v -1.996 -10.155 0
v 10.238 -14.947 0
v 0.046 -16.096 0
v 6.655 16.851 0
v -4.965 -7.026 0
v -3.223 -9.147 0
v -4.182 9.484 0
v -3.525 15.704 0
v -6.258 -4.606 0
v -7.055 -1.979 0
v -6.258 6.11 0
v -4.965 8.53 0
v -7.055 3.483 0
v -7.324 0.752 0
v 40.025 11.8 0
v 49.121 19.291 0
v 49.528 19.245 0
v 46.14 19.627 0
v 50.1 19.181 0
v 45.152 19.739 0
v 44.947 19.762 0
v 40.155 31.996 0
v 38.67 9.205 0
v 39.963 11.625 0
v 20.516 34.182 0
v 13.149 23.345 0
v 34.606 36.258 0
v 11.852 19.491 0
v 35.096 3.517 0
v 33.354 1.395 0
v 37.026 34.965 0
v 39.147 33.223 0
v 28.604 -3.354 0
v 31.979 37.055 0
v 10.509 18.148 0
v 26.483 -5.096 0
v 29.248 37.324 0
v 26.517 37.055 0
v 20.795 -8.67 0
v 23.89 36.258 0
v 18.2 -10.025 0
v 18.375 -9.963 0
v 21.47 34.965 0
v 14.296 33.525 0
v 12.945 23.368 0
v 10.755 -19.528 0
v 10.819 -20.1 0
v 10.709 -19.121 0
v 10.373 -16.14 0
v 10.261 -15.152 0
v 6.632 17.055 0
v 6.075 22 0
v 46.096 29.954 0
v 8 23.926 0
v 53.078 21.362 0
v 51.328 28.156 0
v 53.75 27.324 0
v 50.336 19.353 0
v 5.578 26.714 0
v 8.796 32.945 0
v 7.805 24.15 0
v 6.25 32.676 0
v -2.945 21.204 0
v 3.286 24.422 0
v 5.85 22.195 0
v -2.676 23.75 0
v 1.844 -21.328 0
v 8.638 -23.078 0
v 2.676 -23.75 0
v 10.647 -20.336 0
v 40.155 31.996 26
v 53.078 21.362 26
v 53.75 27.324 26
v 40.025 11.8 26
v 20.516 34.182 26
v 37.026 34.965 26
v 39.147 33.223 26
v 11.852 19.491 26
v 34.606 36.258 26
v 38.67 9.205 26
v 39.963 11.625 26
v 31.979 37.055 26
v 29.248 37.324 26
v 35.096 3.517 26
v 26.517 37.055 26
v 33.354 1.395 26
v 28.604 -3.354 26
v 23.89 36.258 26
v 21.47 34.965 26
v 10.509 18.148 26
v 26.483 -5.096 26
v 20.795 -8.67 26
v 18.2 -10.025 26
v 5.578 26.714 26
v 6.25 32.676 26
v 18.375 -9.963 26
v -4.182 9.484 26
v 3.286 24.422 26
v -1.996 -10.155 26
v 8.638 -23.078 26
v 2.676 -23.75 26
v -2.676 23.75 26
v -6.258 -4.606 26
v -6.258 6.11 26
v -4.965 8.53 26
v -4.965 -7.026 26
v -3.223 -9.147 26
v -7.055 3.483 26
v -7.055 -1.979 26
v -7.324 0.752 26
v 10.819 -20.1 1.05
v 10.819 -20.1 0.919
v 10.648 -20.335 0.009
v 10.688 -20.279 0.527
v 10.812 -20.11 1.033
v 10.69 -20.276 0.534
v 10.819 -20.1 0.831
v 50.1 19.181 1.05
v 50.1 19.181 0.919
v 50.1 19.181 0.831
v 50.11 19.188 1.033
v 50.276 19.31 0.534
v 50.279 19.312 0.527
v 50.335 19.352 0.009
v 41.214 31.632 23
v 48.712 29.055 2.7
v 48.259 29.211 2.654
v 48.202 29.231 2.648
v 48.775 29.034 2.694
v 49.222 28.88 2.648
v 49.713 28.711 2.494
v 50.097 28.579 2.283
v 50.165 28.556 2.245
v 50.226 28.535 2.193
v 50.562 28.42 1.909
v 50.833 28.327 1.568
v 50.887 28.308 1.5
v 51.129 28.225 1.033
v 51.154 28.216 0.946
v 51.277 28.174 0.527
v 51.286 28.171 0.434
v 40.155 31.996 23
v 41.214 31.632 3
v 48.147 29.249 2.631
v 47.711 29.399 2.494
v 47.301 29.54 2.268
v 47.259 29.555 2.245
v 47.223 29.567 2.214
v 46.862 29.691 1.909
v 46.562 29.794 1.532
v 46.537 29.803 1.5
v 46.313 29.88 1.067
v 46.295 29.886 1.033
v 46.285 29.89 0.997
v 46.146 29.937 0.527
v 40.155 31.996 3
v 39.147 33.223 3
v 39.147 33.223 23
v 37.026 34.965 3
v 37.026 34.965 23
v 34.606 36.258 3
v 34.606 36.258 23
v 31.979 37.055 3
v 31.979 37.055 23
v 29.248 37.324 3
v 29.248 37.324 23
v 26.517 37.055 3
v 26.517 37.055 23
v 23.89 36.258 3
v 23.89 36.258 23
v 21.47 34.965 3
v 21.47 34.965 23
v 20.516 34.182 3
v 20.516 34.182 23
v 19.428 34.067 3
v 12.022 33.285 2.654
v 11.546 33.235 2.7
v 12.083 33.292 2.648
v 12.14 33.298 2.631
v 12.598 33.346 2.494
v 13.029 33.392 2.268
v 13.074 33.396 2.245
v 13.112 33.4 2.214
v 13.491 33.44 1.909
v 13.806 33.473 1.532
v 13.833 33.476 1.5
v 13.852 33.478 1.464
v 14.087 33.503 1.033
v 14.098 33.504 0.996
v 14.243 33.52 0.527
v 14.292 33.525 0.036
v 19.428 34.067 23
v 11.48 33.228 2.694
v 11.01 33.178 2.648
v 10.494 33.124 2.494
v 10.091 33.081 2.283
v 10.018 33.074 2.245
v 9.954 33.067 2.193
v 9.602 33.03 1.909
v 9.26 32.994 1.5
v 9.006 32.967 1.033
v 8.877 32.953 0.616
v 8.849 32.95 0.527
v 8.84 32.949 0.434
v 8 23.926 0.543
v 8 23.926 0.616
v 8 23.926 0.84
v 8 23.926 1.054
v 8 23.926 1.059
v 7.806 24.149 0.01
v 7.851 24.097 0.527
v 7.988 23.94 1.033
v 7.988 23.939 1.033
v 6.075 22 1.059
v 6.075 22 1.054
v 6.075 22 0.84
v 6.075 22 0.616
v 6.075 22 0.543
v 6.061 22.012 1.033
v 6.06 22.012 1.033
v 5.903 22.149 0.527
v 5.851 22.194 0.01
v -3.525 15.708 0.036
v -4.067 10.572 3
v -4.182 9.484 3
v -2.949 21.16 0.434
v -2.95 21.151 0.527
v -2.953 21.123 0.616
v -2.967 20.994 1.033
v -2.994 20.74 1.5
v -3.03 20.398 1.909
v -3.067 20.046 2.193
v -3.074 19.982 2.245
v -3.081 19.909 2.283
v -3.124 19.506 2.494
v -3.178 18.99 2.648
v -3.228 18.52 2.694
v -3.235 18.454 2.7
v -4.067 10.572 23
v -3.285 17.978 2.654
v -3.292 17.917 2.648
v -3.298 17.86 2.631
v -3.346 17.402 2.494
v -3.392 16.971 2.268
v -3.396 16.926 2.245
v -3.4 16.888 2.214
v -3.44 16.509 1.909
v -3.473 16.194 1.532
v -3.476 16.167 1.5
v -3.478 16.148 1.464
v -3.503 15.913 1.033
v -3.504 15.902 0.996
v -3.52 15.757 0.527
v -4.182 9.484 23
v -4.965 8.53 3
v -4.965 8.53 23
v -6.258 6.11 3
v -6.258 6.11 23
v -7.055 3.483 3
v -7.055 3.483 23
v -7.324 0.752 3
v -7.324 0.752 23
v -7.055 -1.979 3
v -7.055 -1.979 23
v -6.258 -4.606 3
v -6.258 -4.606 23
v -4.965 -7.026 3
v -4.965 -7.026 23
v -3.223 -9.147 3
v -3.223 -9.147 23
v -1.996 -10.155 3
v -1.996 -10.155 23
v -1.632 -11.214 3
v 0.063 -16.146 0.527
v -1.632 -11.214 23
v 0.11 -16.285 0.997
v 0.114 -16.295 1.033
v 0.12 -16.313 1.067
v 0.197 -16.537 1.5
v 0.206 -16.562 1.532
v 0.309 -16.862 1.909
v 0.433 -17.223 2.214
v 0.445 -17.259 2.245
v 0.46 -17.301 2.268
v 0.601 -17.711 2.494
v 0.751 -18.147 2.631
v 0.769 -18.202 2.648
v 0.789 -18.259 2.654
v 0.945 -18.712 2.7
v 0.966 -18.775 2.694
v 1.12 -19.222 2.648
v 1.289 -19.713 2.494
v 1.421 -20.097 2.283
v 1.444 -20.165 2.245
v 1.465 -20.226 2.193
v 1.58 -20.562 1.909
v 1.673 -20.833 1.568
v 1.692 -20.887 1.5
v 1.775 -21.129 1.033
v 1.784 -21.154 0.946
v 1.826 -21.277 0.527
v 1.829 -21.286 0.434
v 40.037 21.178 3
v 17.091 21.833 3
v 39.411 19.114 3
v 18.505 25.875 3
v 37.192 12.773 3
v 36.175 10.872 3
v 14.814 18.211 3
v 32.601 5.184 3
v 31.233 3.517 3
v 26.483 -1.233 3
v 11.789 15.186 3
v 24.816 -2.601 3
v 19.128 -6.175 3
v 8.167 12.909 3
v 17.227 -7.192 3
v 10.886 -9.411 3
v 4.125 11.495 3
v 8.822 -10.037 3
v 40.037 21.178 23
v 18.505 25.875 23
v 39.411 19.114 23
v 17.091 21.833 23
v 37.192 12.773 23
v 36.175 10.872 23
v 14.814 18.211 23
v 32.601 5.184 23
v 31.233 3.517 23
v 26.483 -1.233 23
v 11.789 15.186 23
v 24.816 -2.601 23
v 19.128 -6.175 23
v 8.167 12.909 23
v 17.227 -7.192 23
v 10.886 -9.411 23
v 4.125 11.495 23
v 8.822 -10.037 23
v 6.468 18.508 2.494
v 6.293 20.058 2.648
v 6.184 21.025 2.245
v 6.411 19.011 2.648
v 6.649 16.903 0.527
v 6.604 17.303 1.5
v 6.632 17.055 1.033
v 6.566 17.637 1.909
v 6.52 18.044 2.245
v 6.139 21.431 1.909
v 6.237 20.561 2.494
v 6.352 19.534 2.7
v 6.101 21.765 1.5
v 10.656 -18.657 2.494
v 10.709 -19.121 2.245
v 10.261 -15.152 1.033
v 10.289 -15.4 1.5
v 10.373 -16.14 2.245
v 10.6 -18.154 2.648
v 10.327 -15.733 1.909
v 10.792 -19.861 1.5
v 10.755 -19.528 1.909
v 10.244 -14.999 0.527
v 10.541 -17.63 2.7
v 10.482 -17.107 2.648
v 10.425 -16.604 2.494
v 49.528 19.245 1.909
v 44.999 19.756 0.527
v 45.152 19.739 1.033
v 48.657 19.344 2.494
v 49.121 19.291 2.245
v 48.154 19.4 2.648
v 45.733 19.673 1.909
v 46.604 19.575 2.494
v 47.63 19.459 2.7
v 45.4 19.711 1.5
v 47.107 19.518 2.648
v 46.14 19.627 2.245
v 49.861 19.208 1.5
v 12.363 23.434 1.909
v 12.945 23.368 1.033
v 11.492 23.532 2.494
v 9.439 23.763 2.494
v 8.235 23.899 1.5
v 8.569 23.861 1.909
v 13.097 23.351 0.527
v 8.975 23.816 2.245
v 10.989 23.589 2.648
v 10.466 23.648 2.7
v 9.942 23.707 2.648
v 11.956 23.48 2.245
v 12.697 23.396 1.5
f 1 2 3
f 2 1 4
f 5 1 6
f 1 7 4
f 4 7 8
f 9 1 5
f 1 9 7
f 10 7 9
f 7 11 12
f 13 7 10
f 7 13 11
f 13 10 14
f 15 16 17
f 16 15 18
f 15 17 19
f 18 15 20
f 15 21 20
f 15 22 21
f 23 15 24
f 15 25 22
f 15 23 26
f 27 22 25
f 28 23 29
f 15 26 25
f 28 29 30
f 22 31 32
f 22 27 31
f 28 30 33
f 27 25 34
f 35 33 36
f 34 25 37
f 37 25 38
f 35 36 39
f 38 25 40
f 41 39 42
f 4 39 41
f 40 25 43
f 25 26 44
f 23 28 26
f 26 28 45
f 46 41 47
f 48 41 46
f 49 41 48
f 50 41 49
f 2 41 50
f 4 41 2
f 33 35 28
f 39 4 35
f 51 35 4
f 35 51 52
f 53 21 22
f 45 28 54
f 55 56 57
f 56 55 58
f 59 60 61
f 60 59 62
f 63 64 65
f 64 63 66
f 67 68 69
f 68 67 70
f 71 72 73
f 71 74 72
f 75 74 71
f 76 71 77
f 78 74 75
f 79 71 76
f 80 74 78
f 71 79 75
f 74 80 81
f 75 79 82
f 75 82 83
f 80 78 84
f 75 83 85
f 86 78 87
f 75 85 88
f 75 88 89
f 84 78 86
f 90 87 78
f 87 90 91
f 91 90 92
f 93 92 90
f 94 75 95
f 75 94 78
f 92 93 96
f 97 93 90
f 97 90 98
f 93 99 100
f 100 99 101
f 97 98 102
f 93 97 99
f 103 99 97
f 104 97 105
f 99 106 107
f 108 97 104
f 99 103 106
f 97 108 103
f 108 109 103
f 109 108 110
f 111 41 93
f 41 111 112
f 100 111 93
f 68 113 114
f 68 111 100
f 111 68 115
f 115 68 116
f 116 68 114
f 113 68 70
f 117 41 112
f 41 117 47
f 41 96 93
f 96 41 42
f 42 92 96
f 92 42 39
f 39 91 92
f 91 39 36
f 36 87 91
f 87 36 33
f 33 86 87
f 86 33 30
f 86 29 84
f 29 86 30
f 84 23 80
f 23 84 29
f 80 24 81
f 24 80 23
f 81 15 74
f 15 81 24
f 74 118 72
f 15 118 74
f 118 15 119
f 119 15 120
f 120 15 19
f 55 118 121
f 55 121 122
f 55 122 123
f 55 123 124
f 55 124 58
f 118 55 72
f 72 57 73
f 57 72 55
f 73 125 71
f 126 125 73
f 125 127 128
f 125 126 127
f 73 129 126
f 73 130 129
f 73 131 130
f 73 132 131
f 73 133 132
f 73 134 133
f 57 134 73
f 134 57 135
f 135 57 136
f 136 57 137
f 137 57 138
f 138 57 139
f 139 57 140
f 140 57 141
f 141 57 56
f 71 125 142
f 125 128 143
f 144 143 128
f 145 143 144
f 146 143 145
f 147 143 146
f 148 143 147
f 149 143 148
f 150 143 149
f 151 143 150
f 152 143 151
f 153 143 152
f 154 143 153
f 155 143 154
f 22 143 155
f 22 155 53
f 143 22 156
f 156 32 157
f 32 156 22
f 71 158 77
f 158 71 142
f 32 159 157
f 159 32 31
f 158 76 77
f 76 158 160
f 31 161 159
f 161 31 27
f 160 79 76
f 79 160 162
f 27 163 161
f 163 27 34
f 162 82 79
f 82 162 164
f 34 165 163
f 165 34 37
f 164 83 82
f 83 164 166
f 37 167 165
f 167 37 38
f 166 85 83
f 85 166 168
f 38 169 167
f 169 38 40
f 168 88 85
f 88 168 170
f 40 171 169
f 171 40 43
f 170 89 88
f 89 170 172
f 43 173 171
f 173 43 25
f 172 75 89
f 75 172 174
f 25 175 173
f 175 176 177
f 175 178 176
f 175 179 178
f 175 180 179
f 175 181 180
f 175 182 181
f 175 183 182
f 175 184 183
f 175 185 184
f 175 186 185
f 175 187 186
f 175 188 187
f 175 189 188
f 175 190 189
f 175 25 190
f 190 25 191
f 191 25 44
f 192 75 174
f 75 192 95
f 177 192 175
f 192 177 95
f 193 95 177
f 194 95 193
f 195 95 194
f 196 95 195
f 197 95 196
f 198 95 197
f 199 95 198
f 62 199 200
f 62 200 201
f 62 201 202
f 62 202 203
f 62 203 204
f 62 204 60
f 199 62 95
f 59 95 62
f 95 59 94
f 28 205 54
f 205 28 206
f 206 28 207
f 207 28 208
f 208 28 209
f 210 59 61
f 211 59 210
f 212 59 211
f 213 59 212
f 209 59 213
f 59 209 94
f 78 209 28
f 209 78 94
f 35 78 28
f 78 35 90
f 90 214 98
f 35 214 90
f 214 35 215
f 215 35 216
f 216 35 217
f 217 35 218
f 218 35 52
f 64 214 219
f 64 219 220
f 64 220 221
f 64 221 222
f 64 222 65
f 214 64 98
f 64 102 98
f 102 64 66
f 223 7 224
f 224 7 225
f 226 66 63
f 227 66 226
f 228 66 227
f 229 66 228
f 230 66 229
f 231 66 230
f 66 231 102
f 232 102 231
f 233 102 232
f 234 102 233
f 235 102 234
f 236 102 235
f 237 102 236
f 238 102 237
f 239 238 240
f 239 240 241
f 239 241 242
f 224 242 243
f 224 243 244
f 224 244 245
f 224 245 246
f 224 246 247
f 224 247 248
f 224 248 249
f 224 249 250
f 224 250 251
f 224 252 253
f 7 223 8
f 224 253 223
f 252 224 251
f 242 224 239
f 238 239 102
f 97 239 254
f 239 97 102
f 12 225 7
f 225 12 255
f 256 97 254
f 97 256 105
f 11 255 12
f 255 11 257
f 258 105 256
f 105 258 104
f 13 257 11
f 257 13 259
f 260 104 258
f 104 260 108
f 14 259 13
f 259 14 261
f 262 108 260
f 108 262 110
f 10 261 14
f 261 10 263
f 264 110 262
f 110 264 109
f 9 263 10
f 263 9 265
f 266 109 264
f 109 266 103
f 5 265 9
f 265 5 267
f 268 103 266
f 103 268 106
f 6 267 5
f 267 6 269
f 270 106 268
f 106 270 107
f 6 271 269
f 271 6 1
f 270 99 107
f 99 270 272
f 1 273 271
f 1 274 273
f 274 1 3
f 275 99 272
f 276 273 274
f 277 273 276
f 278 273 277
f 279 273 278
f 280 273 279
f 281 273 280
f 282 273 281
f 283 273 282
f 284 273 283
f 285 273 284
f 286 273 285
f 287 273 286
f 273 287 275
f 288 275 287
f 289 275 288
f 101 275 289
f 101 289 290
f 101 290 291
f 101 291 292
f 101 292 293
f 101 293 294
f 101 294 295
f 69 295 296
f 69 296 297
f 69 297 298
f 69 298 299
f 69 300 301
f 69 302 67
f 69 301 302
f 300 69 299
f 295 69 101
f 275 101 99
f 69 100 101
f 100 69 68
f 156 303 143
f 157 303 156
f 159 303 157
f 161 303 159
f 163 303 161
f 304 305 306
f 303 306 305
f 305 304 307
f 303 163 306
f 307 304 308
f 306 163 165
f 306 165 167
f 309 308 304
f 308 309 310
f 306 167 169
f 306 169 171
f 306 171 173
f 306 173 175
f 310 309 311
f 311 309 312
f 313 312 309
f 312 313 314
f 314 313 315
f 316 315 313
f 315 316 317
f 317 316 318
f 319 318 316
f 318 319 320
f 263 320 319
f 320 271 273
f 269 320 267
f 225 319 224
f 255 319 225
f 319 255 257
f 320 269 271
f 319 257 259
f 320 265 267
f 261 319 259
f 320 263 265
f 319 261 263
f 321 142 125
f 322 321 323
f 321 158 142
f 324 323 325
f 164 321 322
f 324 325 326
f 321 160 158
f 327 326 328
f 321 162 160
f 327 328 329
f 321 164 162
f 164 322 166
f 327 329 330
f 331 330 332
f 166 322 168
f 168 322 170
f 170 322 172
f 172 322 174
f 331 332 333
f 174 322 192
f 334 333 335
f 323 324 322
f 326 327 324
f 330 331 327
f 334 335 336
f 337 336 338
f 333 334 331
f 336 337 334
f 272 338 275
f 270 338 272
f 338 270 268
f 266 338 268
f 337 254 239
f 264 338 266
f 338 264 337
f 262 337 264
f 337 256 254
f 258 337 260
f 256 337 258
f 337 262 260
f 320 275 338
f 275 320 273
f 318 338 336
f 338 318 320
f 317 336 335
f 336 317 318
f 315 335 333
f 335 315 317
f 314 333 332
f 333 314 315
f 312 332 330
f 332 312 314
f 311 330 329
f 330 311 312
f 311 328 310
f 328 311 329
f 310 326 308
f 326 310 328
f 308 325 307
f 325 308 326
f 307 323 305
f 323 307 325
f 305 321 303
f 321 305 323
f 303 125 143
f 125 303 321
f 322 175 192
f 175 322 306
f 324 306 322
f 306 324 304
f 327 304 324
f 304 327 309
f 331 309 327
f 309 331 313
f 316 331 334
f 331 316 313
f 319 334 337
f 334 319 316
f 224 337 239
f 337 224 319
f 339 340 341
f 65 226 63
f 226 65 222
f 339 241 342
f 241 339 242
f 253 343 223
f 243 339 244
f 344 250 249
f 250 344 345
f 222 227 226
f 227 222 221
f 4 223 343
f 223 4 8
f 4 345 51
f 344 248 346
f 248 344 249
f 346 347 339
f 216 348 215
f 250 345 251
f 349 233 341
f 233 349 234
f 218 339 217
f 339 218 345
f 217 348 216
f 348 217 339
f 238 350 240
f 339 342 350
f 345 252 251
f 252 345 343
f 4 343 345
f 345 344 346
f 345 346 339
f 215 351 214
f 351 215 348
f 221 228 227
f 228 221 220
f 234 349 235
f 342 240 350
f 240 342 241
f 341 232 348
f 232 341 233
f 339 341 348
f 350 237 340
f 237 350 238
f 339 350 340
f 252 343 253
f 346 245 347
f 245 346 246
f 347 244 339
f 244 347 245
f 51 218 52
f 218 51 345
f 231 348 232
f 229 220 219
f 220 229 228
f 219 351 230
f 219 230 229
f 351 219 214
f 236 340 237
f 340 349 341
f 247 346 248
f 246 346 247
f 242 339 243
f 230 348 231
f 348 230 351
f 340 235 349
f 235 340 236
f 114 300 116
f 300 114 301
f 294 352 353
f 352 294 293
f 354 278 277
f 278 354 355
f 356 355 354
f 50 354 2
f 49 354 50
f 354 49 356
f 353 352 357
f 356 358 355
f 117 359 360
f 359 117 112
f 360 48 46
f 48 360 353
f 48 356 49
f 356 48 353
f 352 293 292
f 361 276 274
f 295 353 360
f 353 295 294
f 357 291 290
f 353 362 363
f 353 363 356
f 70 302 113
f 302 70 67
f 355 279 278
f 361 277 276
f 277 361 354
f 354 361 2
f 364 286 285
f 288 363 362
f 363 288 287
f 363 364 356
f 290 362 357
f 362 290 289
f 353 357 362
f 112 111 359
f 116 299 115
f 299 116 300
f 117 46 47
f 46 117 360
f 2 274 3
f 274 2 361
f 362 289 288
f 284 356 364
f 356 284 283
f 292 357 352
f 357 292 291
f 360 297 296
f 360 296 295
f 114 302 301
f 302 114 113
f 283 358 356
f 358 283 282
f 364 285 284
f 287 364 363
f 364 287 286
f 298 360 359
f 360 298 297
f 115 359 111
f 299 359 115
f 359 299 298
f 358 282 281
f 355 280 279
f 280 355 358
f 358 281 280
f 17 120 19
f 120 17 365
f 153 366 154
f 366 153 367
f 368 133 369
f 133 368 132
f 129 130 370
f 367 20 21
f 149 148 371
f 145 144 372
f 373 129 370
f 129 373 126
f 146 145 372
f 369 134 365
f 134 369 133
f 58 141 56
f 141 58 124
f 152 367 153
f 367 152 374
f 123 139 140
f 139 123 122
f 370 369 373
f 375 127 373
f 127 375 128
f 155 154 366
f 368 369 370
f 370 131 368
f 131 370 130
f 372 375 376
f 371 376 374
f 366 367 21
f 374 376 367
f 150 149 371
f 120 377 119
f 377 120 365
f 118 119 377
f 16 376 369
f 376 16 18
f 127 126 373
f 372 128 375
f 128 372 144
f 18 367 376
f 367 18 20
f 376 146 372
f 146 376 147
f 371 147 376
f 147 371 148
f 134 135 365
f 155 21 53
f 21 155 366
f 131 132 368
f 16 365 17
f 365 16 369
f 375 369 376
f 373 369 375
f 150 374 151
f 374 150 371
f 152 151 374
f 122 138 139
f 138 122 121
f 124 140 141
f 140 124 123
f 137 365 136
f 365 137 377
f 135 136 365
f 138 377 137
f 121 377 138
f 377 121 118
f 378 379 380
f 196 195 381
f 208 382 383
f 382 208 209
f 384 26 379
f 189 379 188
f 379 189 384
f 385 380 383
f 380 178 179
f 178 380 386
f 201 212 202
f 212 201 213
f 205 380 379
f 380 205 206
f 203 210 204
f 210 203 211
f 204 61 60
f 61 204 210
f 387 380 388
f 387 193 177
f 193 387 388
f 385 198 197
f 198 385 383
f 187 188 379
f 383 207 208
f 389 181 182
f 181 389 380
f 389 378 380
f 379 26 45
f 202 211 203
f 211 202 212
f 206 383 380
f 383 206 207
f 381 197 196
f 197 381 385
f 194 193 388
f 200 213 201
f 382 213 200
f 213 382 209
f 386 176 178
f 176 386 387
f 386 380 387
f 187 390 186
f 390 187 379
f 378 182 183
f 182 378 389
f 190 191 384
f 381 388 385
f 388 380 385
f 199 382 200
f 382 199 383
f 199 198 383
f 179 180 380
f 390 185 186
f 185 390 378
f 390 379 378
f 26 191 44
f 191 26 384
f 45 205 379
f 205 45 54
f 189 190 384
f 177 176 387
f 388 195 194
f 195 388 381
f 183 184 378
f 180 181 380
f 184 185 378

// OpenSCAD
$fn = 32;

// ----------------------------------------------------------------------
// Air duct: 28 mm duct, 3 mm wall, 26 mm across
// ----------------------------------------------------------------------

// --- parameters (mm) ---
duct_r = 14;              // duct core radius
duct_d = 28;              // duct core diameter
wall = 3;                 // duct wall thickness
height = 26;              // duct width (extrusion height)
port_r = 23.9;            // port flange half width
port_d = 47.8;            // port flange width
port_t = 6;               // port flange thickness
bolt_d = 5.4;             // port bolt holes
bolt_offset = 18.7;       // bolt hole offset from the port axis

difference() {
  /* outer hull chain: tube with a flat flange plate at every port */
  linear_extrude(height = 26) {
    hull() {
      polygon([[2.676, -23.75], [-2.676, 23.75], [3.286, 24.422], [8.638, -23.078]]);
      translate([8.943, 1.008]) circle(r = 14);
    }
    hull() {
      translate([8.943, 1.008]) circle(r = 14);
      translate([6.676, 0.752]) circle(r = 14);
    }
    hull() {
      translate([6.676, 0.752]) circle(r = 14);
      translate([13.017, 2.971]) circle(r = 14);
    }
    hull() {
      translate([13.017, 2.971]) circle(r = 14);
      translate([18.705, 6.545]) circle(r = 14);
    }
    hull() {
      translate([18.705, 6.545]) circle(r = 14);
      translate([23.455, 11.295]) circle(r = 14);
    }
    hull() {
      translate([23.455, 11.295]) circle(r = 14);
      translate([27.029, 16.983]) circle(r = 14);
    }
    hull() {
      translate([27.029, 16.983]) circle(r = 14);
      translate([29.248, 23.324]) circle(r = 14);
    }
    hull() {
      translate([29.248, 23.324]) circle(r = 14);
      translate([28.992, 21.057]) circle(r = 14);
    }
    hull() {
      translate([28.992, 21.057]) circle(r = 14);
      polygon([[6.25, 32.676], [53.75, 27.324], [53.078, 21.362], [5.578, 26.714]]);
    }
  }
  /* air passage: the same chain inset by the wall, 5 mm proud of the ports */
  translate([0, 0, 3]) linear_extrude(height = 20) {
    hull() {
      translate([-4.969, -0.56]) circle(r = 11);
      translate([6.676, 0.752]) circle(r = 11);
    }
    hull() {
      translate([6.676, 0.752]) circle(r = 11);
      translate([13.017, 2.971]) circle(r = 11);
    }
    hull() {
      translate([13.017, 2.971]) circle(r = 11);
      translate([18.705, 6.545]) circle(r = 11);
    }
    hull() {
      translate([18.705, 6.545]) circle(r = 11);
      translate([23.455, 11.295]) circle(r = 11);
    }
    hull() {
      translate([23.455, 11.295]) circle(r = 11);
      translate([27.029, 16.983]) circle(r = 11);
    }
    hull() {
      translate([27.029, 16.983]) circle(r = 11);
      translate([29.248, 23.324]) circle(r = 11);
    }
    hull() {
      translate([29.248, 23.324]) circle(r = 11);
      translate([30.56, 34.969]) circle(r = 11);
    }
  }
  translate([0, 0]) rotate([0, 0, -83.57]) translate([-18.7, -2.5]) rotate([-90, 0, 0]) cylinder(h = 11, d = 5.4);
  translate([0, 0]) rotate([0, 0, -83.57]) translate([18.7, -2.5]) rotate([-90, 0, 0]) cylinder(h = 11, d = 5.4);
  translate([30, 30]) rotate([0, 0, 173.57]) translate([-18.7, -2.5]) rotate([-90, 0, 0]) cylinder(h = 11, d = 5.4);
  translate([30, 30]) rotate([0, 0, 173.57]) translate([18.7, -2.5]) rotate([-90, 0, 0]) cylinder(h = 11, d = 5.4);
}
